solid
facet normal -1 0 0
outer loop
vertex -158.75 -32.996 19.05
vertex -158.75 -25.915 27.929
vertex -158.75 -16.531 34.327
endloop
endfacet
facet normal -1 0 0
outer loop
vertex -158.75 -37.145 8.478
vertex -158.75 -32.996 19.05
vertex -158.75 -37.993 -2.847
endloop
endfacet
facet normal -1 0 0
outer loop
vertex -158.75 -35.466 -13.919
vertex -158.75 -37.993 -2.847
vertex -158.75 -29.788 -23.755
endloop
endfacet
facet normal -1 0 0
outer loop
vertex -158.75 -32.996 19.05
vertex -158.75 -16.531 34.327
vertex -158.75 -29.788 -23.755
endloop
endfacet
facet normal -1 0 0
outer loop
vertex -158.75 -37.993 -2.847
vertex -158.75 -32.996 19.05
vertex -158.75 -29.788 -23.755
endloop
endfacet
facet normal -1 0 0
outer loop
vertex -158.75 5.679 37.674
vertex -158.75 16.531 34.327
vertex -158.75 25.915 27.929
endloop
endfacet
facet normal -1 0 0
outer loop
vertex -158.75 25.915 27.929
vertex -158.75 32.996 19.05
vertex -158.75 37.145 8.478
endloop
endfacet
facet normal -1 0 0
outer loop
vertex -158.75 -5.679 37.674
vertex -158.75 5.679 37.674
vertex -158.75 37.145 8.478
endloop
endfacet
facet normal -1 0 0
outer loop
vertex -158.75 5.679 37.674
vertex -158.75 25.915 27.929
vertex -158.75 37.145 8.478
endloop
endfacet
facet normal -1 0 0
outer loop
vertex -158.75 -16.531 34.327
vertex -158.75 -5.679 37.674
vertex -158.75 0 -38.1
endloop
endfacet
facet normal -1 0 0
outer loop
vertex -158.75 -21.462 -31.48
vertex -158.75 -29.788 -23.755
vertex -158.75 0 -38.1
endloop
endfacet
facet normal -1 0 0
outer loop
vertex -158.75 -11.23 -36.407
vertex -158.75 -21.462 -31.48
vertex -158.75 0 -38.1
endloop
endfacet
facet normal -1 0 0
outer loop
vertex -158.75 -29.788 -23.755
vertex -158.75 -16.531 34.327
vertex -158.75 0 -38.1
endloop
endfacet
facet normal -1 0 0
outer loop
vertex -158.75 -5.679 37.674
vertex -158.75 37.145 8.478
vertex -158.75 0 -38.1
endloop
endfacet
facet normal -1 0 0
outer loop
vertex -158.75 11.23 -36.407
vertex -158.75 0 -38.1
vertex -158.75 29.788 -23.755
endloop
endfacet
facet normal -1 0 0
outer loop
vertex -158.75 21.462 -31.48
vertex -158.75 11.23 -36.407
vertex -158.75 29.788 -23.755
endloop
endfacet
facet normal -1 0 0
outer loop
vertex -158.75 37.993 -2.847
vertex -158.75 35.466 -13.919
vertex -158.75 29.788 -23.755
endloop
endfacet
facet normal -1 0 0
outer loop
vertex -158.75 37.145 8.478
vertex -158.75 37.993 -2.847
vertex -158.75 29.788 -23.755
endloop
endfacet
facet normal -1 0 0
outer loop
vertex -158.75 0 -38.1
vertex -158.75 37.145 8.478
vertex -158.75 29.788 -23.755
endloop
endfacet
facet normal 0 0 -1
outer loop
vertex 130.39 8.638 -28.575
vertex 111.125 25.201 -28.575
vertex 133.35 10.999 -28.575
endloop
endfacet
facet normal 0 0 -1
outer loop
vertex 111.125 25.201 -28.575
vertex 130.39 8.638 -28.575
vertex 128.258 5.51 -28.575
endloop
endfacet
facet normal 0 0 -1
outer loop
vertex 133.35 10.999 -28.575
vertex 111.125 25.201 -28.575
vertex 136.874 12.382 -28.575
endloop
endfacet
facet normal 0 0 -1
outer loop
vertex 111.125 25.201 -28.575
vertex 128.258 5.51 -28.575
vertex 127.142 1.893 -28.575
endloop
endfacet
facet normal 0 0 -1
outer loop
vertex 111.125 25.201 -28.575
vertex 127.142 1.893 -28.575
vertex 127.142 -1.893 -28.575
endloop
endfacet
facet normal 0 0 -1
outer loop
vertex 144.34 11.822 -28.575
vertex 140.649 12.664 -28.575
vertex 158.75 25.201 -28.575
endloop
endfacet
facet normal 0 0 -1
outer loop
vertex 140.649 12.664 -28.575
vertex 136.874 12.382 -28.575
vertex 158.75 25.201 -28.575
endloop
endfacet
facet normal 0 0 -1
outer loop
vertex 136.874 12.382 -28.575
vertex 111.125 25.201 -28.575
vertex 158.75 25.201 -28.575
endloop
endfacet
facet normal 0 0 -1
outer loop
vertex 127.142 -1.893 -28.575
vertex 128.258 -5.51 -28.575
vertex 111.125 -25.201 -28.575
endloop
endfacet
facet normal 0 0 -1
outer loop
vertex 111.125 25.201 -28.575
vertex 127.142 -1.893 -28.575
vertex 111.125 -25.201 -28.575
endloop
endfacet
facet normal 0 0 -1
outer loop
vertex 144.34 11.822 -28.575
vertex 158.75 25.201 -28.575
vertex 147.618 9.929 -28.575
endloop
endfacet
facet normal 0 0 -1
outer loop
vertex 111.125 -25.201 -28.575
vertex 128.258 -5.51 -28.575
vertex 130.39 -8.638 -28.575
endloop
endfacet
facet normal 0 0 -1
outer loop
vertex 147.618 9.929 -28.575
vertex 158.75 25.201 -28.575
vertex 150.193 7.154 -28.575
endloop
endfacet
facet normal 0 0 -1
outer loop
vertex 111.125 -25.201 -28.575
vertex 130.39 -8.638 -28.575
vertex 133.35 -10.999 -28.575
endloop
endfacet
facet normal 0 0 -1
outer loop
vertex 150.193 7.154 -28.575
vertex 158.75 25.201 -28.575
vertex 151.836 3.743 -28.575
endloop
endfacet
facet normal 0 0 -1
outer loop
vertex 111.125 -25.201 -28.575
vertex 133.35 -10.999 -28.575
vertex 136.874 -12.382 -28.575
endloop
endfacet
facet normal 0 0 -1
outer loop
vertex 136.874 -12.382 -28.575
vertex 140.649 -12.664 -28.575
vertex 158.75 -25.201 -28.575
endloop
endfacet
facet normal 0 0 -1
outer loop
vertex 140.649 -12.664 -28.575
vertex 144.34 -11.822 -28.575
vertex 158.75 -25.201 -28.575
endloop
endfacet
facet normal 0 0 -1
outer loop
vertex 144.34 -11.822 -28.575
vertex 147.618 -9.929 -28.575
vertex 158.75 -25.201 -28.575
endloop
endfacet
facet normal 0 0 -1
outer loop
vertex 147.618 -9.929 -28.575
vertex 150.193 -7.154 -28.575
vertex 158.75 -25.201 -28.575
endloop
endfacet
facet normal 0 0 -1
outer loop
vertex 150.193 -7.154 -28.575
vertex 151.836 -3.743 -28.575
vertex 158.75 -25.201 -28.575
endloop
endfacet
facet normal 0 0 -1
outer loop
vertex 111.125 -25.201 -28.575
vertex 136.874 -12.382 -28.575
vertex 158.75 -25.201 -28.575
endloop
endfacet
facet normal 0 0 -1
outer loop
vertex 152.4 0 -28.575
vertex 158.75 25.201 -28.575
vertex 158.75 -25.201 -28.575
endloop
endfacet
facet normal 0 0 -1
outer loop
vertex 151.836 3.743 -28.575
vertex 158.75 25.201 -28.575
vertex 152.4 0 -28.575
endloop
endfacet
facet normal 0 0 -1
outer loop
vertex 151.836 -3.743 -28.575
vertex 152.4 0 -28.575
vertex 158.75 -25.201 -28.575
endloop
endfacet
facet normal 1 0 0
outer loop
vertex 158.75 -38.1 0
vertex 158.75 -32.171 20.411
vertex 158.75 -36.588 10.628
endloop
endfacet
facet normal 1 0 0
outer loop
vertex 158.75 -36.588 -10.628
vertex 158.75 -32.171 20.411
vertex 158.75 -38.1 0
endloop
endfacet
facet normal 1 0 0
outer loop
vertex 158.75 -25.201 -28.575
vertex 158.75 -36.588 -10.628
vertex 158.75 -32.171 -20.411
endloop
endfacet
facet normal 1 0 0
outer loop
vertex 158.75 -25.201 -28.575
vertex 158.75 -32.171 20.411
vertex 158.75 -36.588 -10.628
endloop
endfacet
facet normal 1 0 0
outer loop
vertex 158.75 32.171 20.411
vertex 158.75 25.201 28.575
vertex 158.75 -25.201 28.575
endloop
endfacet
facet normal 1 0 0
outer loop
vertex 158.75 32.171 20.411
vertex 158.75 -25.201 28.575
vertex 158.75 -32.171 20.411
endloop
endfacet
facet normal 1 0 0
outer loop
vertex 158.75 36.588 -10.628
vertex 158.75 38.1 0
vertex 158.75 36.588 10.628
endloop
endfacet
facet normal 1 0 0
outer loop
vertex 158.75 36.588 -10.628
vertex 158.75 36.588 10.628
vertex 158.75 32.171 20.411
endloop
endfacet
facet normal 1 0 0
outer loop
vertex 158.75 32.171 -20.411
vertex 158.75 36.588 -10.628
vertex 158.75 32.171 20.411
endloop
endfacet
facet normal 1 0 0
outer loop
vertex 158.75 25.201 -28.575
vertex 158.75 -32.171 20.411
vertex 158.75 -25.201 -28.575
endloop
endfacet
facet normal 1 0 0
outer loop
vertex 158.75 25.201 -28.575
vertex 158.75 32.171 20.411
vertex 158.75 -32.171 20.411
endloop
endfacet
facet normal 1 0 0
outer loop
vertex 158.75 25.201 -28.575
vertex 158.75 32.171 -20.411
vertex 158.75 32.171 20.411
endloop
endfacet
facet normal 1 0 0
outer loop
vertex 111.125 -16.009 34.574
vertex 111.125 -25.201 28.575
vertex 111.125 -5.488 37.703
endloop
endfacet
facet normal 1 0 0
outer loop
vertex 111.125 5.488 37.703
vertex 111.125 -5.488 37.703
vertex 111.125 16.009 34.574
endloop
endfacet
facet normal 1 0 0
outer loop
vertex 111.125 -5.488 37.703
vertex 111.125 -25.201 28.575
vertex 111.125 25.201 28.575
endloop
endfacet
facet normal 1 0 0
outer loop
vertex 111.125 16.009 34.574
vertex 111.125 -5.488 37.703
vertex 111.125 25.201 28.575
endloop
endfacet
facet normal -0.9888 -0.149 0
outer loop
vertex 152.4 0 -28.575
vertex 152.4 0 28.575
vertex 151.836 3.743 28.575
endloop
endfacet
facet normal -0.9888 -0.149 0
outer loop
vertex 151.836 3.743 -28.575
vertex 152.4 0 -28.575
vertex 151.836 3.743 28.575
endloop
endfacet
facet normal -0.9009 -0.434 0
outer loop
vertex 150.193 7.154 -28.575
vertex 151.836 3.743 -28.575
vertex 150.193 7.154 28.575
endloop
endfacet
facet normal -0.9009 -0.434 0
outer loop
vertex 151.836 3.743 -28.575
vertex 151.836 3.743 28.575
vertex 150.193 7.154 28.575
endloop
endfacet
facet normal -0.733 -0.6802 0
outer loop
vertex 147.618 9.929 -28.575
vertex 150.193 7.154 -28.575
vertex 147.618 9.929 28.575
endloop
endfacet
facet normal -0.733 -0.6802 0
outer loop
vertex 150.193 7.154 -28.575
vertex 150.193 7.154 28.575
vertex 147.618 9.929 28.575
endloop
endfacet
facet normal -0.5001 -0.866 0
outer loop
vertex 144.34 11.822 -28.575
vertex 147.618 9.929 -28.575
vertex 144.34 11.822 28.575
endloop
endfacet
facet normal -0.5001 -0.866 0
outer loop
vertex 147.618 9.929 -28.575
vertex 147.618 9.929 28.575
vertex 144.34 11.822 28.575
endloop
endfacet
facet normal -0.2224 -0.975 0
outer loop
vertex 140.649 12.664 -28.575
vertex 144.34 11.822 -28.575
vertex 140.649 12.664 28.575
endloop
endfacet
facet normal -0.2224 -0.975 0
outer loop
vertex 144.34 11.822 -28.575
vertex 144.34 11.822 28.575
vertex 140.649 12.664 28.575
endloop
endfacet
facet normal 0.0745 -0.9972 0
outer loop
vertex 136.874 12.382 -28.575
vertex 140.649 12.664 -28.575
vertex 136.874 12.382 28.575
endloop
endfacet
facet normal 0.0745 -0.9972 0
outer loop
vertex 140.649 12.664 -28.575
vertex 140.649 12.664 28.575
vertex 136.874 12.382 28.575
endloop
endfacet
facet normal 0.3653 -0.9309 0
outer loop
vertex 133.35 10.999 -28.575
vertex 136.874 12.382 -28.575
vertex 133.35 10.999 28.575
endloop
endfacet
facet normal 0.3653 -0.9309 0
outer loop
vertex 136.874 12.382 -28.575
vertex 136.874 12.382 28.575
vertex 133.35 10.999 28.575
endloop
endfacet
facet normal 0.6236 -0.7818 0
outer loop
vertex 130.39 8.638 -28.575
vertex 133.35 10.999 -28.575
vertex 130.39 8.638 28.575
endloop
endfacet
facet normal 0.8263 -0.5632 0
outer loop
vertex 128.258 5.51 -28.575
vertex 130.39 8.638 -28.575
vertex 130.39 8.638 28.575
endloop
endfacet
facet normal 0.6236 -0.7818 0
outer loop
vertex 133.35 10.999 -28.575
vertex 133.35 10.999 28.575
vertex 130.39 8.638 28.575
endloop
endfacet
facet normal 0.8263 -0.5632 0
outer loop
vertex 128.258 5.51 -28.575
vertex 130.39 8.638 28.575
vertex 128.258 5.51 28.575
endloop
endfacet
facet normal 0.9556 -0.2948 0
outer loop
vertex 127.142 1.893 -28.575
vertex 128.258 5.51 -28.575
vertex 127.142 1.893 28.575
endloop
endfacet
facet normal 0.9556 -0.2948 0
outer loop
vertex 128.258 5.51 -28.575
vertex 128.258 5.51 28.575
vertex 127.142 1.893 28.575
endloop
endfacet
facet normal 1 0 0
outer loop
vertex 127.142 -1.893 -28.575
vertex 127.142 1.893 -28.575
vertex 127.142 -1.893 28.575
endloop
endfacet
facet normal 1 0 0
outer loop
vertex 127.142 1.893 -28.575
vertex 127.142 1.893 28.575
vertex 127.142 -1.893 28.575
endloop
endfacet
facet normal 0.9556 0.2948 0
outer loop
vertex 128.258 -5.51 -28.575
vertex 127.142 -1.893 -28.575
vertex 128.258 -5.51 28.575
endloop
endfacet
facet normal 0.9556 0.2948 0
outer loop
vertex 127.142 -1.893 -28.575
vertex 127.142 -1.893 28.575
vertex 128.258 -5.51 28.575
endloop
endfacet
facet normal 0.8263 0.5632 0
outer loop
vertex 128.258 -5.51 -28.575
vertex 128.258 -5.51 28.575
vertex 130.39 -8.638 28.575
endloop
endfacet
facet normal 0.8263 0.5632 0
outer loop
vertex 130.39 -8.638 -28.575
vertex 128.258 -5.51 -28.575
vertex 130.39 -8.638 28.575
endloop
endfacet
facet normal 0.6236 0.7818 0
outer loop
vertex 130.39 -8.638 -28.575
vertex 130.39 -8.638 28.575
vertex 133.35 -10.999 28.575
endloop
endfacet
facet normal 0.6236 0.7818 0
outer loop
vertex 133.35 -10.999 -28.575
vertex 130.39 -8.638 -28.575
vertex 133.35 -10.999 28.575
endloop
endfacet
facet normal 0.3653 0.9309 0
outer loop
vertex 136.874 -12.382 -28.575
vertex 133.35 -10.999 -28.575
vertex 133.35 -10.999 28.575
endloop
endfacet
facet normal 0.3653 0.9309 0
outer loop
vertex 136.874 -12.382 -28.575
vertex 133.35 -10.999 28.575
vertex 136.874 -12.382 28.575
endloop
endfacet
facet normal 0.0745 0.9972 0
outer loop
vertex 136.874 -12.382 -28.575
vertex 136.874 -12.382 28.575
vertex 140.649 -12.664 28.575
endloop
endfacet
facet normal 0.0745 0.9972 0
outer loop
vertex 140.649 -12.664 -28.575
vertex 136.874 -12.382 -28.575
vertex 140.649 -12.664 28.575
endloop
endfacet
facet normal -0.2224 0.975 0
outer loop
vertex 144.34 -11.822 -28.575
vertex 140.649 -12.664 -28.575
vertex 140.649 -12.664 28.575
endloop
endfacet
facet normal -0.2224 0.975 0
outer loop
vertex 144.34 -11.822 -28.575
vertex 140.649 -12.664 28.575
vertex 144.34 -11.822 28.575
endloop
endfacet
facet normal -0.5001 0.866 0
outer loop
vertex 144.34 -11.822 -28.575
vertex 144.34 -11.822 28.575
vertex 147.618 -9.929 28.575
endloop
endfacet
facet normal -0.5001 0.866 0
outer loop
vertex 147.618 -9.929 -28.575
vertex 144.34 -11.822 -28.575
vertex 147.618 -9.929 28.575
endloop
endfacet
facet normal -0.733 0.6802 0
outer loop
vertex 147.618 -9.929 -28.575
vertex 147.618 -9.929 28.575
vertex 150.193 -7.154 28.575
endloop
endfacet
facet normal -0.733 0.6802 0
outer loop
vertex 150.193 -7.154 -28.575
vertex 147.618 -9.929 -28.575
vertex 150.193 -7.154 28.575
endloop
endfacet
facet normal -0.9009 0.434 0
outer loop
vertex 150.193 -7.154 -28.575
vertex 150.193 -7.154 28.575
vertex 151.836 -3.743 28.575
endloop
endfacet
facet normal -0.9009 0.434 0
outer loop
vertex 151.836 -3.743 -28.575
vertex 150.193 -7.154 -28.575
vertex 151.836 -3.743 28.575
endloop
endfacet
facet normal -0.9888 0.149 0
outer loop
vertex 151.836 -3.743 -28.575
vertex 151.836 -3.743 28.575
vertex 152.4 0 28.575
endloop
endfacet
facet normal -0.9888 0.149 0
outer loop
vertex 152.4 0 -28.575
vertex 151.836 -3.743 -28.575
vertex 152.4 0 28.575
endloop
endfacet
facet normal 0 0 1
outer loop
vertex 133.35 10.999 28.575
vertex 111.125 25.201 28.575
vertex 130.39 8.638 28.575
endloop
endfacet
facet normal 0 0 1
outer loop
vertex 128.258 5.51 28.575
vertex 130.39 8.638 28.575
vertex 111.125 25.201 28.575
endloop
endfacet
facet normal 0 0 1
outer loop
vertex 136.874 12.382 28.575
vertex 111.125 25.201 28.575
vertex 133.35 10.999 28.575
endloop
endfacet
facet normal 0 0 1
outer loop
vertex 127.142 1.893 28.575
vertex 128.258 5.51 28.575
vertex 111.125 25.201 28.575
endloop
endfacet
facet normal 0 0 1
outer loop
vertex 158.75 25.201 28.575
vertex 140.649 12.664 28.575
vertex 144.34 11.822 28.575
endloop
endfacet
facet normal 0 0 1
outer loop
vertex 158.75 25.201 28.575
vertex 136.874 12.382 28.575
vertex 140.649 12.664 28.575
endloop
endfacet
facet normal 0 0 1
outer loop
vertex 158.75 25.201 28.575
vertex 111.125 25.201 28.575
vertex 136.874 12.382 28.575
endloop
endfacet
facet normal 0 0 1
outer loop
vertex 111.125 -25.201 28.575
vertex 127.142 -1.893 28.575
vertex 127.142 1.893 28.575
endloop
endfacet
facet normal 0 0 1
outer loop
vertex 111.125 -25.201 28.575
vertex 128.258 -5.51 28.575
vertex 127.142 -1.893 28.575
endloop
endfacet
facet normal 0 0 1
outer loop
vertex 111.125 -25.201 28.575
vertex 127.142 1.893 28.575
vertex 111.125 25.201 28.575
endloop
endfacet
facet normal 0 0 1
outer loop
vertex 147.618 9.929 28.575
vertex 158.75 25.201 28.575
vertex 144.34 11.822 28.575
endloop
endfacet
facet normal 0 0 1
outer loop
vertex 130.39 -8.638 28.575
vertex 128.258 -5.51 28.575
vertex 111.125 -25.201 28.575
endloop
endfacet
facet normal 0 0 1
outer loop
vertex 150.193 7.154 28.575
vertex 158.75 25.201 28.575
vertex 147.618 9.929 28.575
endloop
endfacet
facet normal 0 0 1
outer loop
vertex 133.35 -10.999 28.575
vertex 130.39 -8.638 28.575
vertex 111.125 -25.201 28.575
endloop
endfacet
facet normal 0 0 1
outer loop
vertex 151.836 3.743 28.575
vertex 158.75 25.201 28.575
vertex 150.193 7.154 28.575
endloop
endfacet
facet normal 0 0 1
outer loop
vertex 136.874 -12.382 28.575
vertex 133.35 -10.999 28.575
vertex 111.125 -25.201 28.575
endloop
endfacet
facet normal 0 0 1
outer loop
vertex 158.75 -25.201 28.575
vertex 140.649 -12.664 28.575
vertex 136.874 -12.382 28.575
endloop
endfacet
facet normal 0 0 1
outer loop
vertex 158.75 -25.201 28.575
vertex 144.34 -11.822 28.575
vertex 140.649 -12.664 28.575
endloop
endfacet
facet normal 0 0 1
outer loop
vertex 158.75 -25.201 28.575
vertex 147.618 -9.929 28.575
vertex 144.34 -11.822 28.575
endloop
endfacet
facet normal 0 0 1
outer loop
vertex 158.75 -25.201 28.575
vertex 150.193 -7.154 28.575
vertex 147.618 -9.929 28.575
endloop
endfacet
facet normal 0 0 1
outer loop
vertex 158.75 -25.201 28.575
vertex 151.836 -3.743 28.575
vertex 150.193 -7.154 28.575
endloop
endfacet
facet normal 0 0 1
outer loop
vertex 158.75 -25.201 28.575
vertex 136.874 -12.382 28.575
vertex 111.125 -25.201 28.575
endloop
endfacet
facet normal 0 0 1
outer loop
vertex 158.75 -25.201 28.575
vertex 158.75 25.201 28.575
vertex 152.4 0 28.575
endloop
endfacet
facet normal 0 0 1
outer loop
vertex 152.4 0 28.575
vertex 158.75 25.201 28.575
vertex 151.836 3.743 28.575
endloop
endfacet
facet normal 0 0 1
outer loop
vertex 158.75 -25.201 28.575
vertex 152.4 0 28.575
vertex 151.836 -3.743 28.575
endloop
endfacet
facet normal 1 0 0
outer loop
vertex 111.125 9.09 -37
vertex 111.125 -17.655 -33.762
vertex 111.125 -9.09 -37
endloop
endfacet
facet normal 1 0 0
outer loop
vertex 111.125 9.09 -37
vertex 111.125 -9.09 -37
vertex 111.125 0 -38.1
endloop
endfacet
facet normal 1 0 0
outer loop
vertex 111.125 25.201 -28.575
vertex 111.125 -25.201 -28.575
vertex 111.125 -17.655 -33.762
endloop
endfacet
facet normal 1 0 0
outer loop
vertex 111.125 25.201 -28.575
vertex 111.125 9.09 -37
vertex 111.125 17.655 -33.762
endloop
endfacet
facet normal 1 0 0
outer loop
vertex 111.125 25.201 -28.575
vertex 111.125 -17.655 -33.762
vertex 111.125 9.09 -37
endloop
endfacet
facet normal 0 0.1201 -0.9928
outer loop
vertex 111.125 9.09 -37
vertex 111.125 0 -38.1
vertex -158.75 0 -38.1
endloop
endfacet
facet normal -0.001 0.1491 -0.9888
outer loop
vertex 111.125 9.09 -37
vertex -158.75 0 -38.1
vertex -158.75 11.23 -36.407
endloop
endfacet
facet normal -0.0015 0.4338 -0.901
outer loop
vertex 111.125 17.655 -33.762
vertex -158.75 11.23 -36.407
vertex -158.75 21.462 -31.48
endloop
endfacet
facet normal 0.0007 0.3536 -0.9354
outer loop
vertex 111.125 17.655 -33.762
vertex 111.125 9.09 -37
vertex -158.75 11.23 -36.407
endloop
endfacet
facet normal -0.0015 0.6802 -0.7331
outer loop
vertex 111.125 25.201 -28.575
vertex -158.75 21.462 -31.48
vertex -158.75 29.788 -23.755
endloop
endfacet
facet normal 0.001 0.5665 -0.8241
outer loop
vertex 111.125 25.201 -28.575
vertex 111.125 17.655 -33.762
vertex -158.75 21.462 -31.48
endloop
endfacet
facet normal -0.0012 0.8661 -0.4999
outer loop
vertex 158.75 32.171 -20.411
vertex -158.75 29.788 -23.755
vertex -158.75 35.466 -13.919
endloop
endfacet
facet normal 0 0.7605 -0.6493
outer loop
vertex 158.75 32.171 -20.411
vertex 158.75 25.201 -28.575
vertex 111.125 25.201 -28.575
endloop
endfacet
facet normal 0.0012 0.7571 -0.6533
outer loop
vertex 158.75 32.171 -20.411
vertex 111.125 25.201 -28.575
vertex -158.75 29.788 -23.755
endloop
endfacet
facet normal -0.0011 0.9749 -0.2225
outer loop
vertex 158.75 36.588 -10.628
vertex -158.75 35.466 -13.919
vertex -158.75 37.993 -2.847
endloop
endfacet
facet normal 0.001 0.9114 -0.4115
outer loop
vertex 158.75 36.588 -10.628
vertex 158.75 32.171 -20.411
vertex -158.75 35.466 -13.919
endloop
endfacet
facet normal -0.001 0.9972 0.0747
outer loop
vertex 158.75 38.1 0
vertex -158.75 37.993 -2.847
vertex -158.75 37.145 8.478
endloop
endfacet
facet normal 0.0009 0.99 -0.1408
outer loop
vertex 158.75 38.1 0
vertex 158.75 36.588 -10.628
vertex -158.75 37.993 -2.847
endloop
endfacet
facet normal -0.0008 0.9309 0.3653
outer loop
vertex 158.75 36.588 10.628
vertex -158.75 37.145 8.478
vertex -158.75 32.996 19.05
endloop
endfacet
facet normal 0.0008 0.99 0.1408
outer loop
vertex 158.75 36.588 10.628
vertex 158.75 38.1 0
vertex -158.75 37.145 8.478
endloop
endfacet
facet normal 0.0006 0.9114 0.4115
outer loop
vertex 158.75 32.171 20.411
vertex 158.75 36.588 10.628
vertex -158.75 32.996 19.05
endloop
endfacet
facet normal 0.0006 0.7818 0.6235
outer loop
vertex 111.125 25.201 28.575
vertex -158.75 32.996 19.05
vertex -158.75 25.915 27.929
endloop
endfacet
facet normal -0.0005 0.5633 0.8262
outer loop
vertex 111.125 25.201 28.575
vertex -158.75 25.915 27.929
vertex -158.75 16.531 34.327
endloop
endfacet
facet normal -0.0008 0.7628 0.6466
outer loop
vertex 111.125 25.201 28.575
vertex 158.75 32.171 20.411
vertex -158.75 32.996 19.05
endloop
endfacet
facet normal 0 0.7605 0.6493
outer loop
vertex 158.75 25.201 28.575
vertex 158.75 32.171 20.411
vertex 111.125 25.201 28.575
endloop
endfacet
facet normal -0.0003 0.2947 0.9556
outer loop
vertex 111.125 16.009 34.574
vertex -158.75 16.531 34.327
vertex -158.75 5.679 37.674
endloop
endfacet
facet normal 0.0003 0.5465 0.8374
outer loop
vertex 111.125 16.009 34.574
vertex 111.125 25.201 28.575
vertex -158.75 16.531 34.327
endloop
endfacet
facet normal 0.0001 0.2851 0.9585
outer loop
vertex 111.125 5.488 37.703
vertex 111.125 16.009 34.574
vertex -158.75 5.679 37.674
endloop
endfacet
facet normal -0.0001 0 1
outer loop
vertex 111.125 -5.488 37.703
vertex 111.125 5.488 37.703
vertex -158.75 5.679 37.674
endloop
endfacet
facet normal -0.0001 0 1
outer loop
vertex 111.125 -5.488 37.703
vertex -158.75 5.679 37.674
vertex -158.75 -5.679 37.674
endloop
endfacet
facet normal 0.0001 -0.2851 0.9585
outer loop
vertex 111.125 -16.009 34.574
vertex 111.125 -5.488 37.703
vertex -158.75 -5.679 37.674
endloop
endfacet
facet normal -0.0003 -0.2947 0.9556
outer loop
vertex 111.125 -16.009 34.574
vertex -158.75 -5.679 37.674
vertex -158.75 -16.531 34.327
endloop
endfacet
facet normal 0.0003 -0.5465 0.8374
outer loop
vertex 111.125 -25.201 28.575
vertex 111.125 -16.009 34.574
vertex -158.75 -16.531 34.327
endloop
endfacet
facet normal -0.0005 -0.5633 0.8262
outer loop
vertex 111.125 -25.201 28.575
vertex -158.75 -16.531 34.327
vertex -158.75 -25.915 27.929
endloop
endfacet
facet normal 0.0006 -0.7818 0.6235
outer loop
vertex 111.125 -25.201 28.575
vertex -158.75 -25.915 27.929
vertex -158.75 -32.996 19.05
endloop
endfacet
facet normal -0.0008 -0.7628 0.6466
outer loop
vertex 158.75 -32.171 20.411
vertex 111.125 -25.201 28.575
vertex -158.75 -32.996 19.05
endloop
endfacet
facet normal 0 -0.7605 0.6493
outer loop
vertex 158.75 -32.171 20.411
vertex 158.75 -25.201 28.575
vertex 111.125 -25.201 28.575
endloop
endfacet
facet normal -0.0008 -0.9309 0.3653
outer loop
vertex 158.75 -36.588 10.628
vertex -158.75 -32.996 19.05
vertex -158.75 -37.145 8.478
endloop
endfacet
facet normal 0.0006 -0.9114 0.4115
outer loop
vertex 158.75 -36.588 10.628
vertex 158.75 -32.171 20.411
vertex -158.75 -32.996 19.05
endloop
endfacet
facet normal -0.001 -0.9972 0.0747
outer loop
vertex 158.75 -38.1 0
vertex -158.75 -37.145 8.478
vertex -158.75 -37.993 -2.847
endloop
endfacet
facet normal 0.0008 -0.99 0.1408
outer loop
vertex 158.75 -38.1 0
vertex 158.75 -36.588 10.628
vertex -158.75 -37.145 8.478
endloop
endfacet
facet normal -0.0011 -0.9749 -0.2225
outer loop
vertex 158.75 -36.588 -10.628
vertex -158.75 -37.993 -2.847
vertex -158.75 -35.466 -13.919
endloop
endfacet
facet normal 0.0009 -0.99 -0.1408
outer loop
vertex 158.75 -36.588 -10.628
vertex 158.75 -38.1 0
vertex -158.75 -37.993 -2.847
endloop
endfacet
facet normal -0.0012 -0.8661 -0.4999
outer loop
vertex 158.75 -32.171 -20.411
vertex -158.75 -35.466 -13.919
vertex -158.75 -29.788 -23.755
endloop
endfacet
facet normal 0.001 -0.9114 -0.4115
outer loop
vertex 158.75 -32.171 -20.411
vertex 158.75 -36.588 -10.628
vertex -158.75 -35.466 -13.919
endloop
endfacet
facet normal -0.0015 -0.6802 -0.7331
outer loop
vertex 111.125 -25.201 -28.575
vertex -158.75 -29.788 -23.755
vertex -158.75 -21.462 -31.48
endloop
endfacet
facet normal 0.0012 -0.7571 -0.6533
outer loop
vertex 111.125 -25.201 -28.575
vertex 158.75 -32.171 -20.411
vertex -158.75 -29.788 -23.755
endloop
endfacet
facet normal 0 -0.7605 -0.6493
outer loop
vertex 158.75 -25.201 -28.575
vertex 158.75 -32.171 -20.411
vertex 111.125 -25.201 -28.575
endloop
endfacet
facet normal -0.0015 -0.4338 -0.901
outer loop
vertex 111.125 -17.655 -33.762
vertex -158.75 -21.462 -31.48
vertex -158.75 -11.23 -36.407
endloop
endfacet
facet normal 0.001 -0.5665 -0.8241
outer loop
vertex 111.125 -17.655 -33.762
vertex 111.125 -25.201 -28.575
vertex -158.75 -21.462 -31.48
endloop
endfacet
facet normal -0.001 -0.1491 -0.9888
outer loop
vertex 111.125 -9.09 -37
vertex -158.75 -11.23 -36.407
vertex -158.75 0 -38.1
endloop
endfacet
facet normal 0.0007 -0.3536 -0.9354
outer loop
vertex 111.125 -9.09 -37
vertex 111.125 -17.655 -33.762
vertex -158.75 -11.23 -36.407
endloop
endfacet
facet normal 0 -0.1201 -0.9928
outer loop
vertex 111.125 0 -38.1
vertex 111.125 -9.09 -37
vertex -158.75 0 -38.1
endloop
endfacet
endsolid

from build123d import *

# Parameters (mm, degrees)
SKETCH2_R           = 38.1
BOSS_EXTRUDE1_DEPTH = 158.75
CUT_EXTRUDE1_DEPTH  = 47.625
SKETCH4_R           = 12.7
CUT_EXTRUDE2_DEPTH  = 67.675


with BuildPart() as part:
    # Sketch2 → Boss-Extrude1 (new body, symmetric)
    with BuildSketch(Plane(origin=(0, 0, 0), x_dir=(0, 0, -1), z_dir=(1, 0, 0))):
        Circle(SKETCH2_R)
    extrude(amount=BOSS_EXTRUDE1_DEPTH, both=True)

    # Sketch3 → Cut-Extrude1 (cut)
    with BuildSketch(Plane(origin=(158.75, 0, 0), x_dir=(0, 0, -1), z_dir=(1, 0, 0))):
        with BuildLine():
            Line((-28.575, 25.200781238), (-28.575, -25.200781238))
            ThreePointArc((-28.575, -25.200781238), (-38.1, 0), (-28.575, 25.200781238))
        make_face()
        with BuildLine():
            Line((28.575, 25.200781238), (28.575, -25.200781238))
            ThreePointArc((28.575, -25.200781238), (38.1, 0), (28.575, 25.200781238))
        make_face()
    extrude(amount=-CUT_EXTRUDE1_DEPTH, mode=Mode.SUBTRACT)

    # Sketch4 → Cut-Extrude2 (cut, through all)
    with BuildSketch(Plane.XY.offset(28.575)):
        with Locations((139.7, 0)):
            Circle(SKETCH4_R)
    extrude(amount=-CUT_EXTRUDE2_DEPTH, mode=Mode.SUBTRACT)


solid = part.part
